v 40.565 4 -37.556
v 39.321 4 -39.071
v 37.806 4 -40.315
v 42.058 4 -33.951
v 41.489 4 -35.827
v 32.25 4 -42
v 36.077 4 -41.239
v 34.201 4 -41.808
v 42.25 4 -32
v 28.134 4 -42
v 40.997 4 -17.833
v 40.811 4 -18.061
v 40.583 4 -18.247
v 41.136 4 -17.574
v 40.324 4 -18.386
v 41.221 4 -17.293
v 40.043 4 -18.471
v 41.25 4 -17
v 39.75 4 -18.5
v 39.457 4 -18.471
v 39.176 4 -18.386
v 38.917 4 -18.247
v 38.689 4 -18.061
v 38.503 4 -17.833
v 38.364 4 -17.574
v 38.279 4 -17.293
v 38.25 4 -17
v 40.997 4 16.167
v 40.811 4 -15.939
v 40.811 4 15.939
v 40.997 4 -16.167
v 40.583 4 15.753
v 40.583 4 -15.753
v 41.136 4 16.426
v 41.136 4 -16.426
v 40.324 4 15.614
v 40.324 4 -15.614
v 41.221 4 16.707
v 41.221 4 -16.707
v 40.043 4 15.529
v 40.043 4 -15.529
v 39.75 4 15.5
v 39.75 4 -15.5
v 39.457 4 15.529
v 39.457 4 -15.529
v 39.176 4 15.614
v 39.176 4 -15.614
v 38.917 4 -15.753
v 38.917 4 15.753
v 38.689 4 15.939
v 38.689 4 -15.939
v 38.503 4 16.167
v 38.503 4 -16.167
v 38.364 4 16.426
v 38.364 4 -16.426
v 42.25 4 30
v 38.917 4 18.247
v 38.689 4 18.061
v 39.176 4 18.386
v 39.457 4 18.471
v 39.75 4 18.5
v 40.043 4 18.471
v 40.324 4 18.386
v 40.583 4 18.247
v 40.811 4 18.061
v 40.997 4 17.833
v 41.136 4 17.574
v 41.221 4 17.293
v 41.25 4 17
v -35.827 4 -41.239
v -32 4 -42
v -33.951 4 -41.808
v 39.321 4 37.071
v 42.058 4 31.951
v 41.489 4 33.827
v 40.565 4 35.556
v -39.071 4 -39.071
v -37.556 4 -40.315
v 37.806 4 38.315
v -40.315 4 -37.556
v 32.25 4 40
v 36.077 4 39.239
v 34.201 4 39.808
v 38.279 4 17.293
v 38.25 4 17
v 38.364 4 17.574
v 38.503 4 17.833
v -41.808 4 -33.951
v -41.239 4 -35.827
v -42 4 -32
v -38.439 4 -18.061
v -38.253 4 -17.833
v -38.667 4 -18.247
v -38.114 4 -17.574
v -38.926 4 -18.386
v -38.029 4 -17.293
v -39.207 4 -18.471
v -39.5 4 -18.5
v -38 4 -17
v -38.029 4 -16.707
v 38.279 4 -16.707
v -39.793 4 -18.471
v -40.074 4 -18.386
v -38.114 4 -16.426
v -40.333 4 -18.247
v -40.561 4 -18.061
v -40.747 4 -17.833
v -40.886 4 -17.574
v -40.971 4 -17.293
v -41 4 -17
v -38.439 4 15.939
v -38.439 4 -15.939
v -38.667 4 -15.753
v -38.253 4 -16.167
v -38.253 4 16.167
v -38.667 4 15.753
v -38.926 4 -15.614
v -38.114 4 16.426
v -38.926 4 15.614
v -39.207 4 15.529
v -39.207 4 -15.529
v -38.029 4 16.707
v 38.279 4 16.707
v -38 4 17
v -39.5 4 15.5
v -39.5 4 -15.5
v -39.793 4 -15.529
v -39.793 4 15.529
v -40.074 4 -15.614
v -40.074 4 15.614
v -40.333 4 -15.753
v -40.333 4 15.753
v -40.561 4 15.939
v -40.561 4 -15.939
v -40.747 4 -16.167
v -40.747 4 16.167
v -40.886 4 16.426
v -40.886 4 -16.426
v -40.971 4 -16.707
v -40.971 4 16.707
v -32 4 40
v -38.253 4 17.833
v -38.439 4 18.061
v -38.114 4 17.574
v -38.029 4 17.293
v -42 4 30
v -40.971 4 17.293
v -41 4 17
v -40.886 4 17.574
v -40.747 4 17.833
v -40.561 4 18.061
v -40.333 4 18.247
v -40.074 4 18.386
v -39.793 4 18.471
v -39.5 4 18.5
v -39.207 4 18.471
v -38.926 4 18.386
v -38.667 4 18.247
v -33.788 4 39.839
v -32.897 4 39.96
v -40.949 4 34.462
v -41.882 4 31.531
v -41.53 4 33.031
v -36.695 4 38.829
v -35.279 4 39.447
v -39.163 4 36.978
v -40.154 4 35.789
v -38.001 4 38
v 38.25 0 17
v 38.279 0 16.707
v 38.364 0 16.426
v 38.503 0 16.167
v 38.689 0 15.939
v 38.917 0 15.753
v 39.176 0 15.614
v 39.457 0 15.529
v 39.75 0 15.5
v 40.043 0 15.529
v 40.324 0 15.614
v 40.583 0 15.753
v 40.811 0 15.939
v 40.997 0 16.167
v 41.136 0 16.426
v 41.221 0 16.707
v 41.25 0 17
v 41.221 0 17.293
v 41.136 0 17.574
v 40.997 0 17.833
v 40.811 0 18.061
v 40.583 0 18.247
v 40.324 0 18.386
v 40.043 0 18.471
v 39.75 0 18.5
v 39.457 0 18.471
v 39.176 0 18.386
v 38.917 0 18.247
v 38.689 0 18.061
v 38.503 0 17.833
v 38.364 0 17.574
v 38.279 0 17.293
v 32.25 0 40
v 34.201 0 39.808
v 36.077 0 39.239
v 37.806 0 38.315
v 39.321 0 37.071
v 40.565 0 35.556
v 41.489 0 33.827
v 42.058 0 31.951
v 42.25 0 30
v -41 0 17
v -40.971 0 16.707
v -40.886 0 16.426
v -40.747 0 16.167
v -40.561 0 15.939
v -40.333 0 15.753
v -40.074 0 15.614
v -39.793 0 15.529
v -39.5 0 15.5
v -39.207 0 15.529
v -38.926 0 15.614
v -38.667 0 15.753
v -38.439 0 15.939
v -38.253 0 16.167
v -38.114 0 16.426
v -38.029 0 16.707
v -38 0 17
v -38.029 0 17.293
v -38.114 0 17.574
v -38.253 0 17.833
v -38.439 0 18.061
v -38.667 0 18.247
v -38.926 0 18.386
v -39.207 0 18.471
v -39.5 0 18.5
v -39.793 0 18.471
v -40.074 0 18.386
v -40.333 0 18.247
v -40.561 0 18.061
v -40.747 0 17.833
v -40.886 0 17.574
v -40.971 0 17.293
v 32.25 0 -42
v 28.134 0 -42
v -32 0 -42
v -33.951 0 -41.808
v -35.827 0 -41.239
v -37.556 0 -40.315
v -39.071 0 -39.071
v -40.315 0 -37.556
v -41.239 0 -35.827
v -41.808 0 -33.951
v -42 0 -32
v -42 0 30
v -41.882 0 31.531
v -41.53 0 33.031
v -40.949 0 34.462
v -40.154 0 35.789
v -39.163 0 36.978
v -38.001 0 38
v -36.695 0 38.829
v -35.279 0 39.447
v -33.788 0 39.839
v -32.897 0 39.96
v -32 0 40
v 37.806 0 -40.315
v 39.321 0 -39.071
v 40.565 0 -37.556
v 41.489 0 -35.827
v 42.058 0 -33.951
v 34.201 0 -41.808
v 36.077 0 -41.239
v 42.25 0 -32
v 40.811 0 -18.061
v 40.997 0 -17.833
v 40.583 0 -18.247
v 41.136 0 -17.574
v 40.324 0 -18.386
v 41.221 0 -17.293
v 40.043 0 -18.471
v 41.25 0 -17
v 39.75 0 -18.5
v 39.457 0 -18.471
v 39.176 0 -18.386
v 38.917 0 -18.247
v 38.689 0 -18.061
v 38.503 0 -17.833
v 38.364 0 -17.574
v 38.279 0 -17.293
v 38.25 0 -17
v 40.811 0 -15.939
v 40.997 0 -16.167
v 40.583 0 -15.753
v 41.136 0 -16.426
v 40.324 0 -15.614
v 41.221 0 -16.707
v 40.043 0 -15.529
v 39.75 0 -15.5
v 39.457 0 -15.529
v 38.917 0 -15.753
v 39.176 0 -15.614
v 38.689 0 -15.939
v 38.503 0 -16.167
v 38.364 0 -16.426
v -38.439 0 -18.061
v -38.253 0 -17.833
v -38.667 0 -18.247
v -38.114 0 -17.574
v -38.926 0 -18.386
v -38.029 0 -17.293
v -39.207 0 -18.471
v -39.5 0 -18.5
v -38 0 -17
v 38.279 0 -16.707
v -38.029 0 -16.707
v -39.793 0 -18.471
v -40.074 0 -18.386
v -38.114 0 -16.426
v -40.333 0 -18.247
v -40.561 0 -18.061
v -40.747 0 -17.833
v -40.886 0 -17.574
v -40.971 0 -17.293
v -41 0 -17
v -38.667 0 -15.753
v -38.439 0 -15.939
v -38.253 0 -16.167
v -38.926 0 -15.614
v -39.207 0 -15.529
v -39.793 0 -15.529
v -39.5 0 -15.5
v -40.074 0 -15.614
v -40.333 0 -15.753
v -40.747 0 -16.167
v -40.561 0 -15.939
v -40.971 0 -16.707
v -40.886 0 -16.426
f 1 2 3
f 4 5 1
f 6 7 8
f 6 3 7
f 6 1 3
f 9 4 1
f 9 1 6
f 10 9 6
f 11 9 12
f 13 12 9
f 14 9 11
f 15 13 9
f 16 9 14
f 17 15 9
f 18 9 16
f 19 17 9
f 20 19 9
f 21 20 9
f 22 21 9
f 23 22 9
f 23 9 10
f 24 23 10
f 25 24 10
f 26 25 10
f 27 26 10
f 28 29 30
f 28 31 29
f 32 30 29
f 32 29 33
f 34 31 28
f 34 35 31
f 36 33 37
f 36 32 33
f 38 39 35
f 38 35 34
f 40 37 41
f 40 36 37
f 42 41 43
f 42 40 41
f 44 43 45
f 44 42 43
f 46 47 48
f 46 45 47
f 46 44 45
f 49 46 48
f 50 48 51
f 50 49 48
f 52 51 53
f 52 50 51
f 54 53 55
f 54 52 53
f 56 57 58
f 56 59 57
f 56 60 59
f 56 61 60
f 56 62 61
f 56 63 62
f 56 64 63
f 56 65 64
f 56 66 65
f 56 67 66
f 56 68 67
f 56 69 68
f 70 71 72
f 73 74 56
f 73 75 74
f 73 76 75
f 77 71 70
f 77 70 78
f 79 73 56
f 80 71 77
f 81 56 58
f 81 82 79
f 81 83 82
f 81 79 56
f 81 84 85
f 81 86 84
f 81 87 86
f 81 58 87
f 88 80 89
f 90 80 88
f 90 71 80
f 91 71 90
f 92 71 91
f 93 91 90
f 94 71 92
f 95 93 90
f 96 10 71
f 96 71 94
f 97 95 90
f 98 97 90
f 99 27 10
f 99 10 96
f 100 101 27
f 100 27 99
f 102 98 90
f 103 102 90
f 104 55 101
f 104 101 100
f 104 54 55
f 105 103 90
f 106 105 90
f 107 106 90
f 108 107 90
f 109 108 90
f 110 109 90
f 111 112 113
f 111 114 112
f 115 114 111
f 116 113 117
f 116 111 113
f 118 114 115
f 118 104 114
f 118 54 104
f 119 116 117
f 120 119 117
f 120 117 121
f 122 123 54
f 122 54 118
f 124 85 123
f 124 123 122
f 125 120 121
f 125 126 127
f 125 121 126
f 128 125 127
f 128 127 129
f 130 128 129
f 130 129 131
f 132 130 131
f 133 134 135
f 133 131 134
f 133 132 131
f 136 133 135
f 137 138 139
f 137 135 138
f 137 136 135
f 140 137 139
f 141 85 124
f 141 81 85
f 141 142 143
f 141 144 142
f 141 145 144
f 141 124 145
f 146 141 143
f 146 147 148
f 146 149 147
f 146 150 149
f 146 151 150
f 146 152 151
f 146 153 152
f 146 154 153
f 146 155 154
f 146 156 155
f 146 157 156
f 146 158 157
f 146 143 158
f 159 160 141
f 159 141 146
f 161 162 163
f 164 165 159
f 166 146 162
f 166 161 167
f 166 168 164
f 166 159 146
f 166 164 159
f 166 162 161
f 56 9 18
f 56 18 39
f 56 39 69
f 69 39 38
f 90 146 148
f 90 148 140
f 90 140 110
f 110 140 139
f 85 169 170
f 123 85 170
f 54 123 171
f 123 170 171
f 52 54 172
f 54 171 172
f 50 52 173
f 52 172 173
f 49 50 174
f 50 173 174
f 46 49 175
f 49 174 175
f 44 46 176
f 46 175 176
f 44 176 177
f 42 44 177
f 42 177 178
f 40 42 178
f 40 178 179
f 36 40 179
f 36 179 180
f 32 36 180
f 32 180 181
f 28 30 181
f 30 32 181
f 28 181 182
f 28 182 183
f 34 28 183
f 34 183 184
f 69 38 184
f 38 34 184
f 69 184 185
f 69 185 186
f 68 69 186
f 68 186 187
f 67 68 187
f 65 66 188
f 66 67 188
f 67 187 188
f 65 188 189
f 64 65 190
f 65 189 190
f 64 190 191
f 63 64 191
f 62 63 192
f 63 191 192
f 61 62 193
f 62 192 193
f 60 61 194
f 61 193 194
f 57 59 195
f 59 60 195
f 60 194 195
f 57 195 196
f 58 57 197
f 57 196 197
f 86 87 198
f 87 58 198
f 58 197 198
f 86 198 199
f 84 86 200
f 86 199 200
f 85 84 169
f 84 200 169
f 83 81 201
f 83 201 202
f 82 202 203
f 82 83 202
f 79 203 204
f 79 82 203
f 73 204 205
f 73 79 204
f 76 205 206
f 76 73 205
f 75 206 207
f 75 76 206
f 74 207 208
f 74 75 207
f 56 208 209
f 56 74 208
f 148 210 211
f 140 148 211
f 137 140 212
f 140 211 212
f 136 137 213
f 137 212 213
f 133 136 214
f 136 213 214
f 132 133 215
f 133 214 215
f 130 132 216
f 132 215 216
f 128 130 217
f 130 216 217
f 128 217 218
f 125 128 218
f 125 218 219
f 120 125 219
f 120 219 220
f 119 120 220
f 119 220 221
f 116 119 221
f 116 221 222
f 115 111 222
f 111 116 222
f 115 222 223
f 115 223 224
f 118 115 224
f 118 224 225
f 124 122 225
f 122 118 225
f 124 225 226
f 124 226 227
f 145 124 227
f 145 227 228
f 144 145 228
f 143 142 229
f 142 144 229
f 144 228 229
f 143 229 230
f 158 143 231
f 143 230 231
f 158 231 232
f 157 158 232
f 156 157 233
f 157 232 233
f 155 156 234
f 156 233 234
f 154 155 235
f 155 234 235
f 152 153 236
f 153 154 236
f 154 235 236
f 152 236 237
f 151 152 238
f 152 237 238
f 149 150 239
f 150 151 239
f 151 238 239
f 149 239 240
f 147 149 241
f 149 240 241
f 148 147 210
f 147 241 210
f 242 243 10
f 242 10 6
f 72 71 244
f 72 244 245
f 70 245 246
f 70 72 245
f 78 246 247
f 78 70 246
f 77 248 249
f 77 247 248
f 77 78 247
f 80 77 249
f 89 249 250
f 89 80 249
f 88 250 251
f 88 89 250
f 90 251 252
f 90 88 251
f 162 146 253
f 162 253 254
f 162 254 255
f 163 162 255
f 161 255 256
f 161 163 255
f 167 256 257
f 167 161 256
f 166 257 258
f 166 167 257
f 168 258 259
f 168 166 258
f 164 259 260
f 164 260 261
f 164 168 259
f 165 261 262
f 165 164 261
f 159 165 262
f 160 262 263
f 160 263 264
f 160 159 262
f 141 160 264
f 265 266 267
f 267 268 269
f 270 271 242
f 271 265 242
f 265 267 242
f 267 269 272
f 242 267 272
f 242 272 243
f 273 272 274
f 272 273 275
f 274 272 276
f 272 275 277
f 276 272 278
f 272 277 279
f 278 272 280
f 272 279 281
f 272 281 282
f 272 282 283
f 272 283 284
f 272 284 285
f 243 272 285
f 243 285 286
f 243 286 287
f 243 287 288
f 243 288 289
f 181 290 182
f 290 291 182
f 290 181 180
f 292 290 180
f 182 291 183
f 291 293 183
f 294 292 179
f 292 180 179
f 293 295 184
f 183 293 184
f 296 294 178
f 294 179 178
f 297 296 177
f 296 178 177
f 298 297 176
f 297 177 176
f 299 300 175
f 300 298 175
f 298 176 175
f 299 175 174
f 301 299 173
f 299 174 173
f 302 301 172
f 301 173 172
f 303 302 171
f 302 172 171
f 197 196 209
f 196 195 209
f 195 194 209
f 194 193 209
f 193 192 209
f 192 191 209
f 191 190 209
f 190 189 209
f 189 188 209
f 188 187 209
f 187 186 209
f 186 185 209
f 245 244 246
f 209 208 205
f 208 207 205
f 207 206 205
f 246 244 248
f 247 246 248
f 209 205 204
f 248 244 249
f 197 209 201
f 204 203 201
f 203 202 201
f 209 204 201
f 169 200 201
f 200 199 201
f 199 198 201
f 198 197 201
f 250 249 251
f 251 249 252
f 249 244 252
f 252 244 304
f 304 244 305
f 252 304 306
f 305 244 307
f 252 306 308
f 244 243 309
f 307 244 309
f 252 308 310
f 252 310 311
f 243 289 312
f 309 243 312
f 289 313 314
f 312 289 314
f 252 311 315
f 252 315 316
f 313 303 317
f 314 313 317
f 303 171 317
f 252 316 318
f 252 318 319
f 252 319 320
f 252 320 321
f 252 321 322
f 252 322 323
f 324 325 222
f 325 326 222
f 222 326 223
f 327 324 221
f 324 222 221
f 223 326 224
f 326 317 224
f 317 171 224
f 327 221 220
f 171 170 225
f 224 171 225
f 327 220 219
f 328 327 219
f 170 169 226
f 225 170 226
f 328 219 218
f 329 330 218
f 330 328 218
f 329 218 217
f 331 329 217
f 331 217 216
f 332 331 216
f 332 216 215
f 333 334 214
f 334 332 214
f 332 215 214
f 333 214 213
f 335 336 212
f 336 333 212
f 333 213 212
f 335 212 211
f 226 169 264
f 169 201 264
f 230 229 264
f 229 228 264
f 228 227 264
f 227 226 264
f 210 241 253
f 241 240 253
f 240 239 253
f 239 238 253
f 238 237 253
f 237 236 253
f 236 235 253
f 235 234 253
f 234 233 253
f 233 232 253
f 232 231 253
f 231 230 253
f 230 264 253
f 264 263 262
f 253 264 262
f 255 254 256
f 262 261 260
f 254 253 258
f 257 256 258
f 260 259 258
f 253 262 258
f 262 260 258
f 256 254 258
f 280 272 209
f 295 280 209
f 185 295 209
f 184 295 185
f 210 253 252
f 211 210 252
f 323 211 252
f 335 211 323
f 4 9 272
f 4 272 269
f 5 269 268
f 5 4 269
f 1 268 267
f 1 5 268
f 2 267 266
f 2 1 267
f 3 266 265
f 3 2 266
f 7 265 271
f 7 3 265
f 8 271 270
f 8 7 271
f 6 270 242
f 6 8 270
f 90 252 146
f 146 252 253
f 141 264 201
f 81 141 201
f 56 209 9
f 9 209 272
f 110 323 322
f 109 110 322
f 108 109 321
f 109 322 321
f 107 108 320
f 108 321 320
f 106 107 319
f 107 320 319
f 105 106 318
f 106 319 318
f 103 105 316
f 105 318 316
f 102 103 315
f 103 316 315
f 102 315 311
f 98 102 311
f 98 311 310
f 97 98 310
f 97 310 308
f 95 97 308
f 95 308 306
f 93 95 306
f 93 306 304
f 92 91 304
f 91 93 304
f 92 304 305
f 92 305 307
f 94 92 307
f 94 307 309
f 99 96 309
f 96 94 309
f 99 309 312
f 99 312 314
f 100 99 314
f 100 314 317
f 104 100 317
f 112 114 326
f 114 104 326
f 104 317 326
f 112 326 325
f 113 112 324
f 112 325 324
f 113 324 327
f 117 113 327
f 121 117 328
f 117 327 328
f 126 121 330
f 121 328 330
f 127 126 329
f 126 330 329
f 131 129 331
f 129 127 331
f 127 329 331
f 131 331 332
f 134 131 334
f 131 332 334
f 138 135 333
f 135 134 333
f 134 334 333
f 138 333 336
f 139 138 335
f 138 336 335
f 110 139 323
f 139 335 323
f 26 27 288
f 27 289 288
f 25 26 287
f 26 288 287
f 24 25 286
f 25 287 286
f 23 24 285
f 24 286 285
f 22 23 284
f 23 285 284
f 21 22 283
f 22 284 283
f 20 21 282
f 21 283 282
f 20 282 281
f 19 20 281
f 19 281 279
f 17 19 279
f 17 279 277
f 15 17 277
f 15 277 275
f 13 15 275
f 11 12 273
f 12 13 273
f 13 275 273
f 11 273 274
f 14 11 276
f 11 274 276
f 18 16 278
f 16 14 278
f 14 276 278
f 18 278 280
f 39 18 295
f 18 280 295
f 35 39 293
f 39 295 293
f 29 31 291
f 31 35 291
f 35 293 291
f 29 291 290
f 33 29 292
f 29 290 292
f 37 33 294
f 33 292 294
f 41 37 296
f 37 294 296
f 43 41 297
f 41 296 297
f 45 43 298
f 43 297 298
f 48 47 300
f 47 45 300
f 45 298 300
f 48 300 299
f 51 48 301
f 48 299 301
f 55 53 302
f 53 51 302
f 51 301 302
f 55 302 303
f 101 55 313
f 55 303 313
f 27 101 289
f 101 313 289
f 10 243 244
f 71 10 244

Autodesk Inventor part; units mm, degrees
ref_plane "YZ Plane" through (0, 0, 0) normal (1, 0, 0) x (0, 1, 0)
ref_plane "XZ Plane" through (0, 0, 0) normal (0, 1, 0) x (-1, 0, 0)
ref_plane "XY Plane" through (0, 0, 0) normal (0, 0, 1) x (1, 0, 0)
sketch "Эскиз1" plane through (0, 0, 0) normal (0, 1, 0) x (-1, 0, 0)
  line L0 (42, 40) -> (42, 38)
  line L1 (-28.1339, -42) -> (-42.25, -42)
  line L2 (42, 40) -> (-42.25, 40)
  line L3 (-42.25, 40) -> (-42.25, -42)
  line L4 (-42.25, -42) -> (42, -42)
  line L5 (42, -42) -> (42, 40)
  circle A0 centre (39.5, -17) radius 1.5
  circle A1 centre (-39.75, -17) radius 1.5
  circle A2 centre (-39.75, 17) radius 1.5
  circle A3 centre (39.5, 17) radius 1.5
  point P0 (0, 0)
  point P1 (0, 0)
extrude "Выдавливание1" add sketch "Эскиз1" along normal blind 4
fillet "Сопряжение1" radius 10 4 edges at (42.25, 2, 40) (42.25, 2, -42) (-42, 2, -42) (-42, 2, 40)
properties part number "KB33-046-004-021 - Зажим точки доступа"
